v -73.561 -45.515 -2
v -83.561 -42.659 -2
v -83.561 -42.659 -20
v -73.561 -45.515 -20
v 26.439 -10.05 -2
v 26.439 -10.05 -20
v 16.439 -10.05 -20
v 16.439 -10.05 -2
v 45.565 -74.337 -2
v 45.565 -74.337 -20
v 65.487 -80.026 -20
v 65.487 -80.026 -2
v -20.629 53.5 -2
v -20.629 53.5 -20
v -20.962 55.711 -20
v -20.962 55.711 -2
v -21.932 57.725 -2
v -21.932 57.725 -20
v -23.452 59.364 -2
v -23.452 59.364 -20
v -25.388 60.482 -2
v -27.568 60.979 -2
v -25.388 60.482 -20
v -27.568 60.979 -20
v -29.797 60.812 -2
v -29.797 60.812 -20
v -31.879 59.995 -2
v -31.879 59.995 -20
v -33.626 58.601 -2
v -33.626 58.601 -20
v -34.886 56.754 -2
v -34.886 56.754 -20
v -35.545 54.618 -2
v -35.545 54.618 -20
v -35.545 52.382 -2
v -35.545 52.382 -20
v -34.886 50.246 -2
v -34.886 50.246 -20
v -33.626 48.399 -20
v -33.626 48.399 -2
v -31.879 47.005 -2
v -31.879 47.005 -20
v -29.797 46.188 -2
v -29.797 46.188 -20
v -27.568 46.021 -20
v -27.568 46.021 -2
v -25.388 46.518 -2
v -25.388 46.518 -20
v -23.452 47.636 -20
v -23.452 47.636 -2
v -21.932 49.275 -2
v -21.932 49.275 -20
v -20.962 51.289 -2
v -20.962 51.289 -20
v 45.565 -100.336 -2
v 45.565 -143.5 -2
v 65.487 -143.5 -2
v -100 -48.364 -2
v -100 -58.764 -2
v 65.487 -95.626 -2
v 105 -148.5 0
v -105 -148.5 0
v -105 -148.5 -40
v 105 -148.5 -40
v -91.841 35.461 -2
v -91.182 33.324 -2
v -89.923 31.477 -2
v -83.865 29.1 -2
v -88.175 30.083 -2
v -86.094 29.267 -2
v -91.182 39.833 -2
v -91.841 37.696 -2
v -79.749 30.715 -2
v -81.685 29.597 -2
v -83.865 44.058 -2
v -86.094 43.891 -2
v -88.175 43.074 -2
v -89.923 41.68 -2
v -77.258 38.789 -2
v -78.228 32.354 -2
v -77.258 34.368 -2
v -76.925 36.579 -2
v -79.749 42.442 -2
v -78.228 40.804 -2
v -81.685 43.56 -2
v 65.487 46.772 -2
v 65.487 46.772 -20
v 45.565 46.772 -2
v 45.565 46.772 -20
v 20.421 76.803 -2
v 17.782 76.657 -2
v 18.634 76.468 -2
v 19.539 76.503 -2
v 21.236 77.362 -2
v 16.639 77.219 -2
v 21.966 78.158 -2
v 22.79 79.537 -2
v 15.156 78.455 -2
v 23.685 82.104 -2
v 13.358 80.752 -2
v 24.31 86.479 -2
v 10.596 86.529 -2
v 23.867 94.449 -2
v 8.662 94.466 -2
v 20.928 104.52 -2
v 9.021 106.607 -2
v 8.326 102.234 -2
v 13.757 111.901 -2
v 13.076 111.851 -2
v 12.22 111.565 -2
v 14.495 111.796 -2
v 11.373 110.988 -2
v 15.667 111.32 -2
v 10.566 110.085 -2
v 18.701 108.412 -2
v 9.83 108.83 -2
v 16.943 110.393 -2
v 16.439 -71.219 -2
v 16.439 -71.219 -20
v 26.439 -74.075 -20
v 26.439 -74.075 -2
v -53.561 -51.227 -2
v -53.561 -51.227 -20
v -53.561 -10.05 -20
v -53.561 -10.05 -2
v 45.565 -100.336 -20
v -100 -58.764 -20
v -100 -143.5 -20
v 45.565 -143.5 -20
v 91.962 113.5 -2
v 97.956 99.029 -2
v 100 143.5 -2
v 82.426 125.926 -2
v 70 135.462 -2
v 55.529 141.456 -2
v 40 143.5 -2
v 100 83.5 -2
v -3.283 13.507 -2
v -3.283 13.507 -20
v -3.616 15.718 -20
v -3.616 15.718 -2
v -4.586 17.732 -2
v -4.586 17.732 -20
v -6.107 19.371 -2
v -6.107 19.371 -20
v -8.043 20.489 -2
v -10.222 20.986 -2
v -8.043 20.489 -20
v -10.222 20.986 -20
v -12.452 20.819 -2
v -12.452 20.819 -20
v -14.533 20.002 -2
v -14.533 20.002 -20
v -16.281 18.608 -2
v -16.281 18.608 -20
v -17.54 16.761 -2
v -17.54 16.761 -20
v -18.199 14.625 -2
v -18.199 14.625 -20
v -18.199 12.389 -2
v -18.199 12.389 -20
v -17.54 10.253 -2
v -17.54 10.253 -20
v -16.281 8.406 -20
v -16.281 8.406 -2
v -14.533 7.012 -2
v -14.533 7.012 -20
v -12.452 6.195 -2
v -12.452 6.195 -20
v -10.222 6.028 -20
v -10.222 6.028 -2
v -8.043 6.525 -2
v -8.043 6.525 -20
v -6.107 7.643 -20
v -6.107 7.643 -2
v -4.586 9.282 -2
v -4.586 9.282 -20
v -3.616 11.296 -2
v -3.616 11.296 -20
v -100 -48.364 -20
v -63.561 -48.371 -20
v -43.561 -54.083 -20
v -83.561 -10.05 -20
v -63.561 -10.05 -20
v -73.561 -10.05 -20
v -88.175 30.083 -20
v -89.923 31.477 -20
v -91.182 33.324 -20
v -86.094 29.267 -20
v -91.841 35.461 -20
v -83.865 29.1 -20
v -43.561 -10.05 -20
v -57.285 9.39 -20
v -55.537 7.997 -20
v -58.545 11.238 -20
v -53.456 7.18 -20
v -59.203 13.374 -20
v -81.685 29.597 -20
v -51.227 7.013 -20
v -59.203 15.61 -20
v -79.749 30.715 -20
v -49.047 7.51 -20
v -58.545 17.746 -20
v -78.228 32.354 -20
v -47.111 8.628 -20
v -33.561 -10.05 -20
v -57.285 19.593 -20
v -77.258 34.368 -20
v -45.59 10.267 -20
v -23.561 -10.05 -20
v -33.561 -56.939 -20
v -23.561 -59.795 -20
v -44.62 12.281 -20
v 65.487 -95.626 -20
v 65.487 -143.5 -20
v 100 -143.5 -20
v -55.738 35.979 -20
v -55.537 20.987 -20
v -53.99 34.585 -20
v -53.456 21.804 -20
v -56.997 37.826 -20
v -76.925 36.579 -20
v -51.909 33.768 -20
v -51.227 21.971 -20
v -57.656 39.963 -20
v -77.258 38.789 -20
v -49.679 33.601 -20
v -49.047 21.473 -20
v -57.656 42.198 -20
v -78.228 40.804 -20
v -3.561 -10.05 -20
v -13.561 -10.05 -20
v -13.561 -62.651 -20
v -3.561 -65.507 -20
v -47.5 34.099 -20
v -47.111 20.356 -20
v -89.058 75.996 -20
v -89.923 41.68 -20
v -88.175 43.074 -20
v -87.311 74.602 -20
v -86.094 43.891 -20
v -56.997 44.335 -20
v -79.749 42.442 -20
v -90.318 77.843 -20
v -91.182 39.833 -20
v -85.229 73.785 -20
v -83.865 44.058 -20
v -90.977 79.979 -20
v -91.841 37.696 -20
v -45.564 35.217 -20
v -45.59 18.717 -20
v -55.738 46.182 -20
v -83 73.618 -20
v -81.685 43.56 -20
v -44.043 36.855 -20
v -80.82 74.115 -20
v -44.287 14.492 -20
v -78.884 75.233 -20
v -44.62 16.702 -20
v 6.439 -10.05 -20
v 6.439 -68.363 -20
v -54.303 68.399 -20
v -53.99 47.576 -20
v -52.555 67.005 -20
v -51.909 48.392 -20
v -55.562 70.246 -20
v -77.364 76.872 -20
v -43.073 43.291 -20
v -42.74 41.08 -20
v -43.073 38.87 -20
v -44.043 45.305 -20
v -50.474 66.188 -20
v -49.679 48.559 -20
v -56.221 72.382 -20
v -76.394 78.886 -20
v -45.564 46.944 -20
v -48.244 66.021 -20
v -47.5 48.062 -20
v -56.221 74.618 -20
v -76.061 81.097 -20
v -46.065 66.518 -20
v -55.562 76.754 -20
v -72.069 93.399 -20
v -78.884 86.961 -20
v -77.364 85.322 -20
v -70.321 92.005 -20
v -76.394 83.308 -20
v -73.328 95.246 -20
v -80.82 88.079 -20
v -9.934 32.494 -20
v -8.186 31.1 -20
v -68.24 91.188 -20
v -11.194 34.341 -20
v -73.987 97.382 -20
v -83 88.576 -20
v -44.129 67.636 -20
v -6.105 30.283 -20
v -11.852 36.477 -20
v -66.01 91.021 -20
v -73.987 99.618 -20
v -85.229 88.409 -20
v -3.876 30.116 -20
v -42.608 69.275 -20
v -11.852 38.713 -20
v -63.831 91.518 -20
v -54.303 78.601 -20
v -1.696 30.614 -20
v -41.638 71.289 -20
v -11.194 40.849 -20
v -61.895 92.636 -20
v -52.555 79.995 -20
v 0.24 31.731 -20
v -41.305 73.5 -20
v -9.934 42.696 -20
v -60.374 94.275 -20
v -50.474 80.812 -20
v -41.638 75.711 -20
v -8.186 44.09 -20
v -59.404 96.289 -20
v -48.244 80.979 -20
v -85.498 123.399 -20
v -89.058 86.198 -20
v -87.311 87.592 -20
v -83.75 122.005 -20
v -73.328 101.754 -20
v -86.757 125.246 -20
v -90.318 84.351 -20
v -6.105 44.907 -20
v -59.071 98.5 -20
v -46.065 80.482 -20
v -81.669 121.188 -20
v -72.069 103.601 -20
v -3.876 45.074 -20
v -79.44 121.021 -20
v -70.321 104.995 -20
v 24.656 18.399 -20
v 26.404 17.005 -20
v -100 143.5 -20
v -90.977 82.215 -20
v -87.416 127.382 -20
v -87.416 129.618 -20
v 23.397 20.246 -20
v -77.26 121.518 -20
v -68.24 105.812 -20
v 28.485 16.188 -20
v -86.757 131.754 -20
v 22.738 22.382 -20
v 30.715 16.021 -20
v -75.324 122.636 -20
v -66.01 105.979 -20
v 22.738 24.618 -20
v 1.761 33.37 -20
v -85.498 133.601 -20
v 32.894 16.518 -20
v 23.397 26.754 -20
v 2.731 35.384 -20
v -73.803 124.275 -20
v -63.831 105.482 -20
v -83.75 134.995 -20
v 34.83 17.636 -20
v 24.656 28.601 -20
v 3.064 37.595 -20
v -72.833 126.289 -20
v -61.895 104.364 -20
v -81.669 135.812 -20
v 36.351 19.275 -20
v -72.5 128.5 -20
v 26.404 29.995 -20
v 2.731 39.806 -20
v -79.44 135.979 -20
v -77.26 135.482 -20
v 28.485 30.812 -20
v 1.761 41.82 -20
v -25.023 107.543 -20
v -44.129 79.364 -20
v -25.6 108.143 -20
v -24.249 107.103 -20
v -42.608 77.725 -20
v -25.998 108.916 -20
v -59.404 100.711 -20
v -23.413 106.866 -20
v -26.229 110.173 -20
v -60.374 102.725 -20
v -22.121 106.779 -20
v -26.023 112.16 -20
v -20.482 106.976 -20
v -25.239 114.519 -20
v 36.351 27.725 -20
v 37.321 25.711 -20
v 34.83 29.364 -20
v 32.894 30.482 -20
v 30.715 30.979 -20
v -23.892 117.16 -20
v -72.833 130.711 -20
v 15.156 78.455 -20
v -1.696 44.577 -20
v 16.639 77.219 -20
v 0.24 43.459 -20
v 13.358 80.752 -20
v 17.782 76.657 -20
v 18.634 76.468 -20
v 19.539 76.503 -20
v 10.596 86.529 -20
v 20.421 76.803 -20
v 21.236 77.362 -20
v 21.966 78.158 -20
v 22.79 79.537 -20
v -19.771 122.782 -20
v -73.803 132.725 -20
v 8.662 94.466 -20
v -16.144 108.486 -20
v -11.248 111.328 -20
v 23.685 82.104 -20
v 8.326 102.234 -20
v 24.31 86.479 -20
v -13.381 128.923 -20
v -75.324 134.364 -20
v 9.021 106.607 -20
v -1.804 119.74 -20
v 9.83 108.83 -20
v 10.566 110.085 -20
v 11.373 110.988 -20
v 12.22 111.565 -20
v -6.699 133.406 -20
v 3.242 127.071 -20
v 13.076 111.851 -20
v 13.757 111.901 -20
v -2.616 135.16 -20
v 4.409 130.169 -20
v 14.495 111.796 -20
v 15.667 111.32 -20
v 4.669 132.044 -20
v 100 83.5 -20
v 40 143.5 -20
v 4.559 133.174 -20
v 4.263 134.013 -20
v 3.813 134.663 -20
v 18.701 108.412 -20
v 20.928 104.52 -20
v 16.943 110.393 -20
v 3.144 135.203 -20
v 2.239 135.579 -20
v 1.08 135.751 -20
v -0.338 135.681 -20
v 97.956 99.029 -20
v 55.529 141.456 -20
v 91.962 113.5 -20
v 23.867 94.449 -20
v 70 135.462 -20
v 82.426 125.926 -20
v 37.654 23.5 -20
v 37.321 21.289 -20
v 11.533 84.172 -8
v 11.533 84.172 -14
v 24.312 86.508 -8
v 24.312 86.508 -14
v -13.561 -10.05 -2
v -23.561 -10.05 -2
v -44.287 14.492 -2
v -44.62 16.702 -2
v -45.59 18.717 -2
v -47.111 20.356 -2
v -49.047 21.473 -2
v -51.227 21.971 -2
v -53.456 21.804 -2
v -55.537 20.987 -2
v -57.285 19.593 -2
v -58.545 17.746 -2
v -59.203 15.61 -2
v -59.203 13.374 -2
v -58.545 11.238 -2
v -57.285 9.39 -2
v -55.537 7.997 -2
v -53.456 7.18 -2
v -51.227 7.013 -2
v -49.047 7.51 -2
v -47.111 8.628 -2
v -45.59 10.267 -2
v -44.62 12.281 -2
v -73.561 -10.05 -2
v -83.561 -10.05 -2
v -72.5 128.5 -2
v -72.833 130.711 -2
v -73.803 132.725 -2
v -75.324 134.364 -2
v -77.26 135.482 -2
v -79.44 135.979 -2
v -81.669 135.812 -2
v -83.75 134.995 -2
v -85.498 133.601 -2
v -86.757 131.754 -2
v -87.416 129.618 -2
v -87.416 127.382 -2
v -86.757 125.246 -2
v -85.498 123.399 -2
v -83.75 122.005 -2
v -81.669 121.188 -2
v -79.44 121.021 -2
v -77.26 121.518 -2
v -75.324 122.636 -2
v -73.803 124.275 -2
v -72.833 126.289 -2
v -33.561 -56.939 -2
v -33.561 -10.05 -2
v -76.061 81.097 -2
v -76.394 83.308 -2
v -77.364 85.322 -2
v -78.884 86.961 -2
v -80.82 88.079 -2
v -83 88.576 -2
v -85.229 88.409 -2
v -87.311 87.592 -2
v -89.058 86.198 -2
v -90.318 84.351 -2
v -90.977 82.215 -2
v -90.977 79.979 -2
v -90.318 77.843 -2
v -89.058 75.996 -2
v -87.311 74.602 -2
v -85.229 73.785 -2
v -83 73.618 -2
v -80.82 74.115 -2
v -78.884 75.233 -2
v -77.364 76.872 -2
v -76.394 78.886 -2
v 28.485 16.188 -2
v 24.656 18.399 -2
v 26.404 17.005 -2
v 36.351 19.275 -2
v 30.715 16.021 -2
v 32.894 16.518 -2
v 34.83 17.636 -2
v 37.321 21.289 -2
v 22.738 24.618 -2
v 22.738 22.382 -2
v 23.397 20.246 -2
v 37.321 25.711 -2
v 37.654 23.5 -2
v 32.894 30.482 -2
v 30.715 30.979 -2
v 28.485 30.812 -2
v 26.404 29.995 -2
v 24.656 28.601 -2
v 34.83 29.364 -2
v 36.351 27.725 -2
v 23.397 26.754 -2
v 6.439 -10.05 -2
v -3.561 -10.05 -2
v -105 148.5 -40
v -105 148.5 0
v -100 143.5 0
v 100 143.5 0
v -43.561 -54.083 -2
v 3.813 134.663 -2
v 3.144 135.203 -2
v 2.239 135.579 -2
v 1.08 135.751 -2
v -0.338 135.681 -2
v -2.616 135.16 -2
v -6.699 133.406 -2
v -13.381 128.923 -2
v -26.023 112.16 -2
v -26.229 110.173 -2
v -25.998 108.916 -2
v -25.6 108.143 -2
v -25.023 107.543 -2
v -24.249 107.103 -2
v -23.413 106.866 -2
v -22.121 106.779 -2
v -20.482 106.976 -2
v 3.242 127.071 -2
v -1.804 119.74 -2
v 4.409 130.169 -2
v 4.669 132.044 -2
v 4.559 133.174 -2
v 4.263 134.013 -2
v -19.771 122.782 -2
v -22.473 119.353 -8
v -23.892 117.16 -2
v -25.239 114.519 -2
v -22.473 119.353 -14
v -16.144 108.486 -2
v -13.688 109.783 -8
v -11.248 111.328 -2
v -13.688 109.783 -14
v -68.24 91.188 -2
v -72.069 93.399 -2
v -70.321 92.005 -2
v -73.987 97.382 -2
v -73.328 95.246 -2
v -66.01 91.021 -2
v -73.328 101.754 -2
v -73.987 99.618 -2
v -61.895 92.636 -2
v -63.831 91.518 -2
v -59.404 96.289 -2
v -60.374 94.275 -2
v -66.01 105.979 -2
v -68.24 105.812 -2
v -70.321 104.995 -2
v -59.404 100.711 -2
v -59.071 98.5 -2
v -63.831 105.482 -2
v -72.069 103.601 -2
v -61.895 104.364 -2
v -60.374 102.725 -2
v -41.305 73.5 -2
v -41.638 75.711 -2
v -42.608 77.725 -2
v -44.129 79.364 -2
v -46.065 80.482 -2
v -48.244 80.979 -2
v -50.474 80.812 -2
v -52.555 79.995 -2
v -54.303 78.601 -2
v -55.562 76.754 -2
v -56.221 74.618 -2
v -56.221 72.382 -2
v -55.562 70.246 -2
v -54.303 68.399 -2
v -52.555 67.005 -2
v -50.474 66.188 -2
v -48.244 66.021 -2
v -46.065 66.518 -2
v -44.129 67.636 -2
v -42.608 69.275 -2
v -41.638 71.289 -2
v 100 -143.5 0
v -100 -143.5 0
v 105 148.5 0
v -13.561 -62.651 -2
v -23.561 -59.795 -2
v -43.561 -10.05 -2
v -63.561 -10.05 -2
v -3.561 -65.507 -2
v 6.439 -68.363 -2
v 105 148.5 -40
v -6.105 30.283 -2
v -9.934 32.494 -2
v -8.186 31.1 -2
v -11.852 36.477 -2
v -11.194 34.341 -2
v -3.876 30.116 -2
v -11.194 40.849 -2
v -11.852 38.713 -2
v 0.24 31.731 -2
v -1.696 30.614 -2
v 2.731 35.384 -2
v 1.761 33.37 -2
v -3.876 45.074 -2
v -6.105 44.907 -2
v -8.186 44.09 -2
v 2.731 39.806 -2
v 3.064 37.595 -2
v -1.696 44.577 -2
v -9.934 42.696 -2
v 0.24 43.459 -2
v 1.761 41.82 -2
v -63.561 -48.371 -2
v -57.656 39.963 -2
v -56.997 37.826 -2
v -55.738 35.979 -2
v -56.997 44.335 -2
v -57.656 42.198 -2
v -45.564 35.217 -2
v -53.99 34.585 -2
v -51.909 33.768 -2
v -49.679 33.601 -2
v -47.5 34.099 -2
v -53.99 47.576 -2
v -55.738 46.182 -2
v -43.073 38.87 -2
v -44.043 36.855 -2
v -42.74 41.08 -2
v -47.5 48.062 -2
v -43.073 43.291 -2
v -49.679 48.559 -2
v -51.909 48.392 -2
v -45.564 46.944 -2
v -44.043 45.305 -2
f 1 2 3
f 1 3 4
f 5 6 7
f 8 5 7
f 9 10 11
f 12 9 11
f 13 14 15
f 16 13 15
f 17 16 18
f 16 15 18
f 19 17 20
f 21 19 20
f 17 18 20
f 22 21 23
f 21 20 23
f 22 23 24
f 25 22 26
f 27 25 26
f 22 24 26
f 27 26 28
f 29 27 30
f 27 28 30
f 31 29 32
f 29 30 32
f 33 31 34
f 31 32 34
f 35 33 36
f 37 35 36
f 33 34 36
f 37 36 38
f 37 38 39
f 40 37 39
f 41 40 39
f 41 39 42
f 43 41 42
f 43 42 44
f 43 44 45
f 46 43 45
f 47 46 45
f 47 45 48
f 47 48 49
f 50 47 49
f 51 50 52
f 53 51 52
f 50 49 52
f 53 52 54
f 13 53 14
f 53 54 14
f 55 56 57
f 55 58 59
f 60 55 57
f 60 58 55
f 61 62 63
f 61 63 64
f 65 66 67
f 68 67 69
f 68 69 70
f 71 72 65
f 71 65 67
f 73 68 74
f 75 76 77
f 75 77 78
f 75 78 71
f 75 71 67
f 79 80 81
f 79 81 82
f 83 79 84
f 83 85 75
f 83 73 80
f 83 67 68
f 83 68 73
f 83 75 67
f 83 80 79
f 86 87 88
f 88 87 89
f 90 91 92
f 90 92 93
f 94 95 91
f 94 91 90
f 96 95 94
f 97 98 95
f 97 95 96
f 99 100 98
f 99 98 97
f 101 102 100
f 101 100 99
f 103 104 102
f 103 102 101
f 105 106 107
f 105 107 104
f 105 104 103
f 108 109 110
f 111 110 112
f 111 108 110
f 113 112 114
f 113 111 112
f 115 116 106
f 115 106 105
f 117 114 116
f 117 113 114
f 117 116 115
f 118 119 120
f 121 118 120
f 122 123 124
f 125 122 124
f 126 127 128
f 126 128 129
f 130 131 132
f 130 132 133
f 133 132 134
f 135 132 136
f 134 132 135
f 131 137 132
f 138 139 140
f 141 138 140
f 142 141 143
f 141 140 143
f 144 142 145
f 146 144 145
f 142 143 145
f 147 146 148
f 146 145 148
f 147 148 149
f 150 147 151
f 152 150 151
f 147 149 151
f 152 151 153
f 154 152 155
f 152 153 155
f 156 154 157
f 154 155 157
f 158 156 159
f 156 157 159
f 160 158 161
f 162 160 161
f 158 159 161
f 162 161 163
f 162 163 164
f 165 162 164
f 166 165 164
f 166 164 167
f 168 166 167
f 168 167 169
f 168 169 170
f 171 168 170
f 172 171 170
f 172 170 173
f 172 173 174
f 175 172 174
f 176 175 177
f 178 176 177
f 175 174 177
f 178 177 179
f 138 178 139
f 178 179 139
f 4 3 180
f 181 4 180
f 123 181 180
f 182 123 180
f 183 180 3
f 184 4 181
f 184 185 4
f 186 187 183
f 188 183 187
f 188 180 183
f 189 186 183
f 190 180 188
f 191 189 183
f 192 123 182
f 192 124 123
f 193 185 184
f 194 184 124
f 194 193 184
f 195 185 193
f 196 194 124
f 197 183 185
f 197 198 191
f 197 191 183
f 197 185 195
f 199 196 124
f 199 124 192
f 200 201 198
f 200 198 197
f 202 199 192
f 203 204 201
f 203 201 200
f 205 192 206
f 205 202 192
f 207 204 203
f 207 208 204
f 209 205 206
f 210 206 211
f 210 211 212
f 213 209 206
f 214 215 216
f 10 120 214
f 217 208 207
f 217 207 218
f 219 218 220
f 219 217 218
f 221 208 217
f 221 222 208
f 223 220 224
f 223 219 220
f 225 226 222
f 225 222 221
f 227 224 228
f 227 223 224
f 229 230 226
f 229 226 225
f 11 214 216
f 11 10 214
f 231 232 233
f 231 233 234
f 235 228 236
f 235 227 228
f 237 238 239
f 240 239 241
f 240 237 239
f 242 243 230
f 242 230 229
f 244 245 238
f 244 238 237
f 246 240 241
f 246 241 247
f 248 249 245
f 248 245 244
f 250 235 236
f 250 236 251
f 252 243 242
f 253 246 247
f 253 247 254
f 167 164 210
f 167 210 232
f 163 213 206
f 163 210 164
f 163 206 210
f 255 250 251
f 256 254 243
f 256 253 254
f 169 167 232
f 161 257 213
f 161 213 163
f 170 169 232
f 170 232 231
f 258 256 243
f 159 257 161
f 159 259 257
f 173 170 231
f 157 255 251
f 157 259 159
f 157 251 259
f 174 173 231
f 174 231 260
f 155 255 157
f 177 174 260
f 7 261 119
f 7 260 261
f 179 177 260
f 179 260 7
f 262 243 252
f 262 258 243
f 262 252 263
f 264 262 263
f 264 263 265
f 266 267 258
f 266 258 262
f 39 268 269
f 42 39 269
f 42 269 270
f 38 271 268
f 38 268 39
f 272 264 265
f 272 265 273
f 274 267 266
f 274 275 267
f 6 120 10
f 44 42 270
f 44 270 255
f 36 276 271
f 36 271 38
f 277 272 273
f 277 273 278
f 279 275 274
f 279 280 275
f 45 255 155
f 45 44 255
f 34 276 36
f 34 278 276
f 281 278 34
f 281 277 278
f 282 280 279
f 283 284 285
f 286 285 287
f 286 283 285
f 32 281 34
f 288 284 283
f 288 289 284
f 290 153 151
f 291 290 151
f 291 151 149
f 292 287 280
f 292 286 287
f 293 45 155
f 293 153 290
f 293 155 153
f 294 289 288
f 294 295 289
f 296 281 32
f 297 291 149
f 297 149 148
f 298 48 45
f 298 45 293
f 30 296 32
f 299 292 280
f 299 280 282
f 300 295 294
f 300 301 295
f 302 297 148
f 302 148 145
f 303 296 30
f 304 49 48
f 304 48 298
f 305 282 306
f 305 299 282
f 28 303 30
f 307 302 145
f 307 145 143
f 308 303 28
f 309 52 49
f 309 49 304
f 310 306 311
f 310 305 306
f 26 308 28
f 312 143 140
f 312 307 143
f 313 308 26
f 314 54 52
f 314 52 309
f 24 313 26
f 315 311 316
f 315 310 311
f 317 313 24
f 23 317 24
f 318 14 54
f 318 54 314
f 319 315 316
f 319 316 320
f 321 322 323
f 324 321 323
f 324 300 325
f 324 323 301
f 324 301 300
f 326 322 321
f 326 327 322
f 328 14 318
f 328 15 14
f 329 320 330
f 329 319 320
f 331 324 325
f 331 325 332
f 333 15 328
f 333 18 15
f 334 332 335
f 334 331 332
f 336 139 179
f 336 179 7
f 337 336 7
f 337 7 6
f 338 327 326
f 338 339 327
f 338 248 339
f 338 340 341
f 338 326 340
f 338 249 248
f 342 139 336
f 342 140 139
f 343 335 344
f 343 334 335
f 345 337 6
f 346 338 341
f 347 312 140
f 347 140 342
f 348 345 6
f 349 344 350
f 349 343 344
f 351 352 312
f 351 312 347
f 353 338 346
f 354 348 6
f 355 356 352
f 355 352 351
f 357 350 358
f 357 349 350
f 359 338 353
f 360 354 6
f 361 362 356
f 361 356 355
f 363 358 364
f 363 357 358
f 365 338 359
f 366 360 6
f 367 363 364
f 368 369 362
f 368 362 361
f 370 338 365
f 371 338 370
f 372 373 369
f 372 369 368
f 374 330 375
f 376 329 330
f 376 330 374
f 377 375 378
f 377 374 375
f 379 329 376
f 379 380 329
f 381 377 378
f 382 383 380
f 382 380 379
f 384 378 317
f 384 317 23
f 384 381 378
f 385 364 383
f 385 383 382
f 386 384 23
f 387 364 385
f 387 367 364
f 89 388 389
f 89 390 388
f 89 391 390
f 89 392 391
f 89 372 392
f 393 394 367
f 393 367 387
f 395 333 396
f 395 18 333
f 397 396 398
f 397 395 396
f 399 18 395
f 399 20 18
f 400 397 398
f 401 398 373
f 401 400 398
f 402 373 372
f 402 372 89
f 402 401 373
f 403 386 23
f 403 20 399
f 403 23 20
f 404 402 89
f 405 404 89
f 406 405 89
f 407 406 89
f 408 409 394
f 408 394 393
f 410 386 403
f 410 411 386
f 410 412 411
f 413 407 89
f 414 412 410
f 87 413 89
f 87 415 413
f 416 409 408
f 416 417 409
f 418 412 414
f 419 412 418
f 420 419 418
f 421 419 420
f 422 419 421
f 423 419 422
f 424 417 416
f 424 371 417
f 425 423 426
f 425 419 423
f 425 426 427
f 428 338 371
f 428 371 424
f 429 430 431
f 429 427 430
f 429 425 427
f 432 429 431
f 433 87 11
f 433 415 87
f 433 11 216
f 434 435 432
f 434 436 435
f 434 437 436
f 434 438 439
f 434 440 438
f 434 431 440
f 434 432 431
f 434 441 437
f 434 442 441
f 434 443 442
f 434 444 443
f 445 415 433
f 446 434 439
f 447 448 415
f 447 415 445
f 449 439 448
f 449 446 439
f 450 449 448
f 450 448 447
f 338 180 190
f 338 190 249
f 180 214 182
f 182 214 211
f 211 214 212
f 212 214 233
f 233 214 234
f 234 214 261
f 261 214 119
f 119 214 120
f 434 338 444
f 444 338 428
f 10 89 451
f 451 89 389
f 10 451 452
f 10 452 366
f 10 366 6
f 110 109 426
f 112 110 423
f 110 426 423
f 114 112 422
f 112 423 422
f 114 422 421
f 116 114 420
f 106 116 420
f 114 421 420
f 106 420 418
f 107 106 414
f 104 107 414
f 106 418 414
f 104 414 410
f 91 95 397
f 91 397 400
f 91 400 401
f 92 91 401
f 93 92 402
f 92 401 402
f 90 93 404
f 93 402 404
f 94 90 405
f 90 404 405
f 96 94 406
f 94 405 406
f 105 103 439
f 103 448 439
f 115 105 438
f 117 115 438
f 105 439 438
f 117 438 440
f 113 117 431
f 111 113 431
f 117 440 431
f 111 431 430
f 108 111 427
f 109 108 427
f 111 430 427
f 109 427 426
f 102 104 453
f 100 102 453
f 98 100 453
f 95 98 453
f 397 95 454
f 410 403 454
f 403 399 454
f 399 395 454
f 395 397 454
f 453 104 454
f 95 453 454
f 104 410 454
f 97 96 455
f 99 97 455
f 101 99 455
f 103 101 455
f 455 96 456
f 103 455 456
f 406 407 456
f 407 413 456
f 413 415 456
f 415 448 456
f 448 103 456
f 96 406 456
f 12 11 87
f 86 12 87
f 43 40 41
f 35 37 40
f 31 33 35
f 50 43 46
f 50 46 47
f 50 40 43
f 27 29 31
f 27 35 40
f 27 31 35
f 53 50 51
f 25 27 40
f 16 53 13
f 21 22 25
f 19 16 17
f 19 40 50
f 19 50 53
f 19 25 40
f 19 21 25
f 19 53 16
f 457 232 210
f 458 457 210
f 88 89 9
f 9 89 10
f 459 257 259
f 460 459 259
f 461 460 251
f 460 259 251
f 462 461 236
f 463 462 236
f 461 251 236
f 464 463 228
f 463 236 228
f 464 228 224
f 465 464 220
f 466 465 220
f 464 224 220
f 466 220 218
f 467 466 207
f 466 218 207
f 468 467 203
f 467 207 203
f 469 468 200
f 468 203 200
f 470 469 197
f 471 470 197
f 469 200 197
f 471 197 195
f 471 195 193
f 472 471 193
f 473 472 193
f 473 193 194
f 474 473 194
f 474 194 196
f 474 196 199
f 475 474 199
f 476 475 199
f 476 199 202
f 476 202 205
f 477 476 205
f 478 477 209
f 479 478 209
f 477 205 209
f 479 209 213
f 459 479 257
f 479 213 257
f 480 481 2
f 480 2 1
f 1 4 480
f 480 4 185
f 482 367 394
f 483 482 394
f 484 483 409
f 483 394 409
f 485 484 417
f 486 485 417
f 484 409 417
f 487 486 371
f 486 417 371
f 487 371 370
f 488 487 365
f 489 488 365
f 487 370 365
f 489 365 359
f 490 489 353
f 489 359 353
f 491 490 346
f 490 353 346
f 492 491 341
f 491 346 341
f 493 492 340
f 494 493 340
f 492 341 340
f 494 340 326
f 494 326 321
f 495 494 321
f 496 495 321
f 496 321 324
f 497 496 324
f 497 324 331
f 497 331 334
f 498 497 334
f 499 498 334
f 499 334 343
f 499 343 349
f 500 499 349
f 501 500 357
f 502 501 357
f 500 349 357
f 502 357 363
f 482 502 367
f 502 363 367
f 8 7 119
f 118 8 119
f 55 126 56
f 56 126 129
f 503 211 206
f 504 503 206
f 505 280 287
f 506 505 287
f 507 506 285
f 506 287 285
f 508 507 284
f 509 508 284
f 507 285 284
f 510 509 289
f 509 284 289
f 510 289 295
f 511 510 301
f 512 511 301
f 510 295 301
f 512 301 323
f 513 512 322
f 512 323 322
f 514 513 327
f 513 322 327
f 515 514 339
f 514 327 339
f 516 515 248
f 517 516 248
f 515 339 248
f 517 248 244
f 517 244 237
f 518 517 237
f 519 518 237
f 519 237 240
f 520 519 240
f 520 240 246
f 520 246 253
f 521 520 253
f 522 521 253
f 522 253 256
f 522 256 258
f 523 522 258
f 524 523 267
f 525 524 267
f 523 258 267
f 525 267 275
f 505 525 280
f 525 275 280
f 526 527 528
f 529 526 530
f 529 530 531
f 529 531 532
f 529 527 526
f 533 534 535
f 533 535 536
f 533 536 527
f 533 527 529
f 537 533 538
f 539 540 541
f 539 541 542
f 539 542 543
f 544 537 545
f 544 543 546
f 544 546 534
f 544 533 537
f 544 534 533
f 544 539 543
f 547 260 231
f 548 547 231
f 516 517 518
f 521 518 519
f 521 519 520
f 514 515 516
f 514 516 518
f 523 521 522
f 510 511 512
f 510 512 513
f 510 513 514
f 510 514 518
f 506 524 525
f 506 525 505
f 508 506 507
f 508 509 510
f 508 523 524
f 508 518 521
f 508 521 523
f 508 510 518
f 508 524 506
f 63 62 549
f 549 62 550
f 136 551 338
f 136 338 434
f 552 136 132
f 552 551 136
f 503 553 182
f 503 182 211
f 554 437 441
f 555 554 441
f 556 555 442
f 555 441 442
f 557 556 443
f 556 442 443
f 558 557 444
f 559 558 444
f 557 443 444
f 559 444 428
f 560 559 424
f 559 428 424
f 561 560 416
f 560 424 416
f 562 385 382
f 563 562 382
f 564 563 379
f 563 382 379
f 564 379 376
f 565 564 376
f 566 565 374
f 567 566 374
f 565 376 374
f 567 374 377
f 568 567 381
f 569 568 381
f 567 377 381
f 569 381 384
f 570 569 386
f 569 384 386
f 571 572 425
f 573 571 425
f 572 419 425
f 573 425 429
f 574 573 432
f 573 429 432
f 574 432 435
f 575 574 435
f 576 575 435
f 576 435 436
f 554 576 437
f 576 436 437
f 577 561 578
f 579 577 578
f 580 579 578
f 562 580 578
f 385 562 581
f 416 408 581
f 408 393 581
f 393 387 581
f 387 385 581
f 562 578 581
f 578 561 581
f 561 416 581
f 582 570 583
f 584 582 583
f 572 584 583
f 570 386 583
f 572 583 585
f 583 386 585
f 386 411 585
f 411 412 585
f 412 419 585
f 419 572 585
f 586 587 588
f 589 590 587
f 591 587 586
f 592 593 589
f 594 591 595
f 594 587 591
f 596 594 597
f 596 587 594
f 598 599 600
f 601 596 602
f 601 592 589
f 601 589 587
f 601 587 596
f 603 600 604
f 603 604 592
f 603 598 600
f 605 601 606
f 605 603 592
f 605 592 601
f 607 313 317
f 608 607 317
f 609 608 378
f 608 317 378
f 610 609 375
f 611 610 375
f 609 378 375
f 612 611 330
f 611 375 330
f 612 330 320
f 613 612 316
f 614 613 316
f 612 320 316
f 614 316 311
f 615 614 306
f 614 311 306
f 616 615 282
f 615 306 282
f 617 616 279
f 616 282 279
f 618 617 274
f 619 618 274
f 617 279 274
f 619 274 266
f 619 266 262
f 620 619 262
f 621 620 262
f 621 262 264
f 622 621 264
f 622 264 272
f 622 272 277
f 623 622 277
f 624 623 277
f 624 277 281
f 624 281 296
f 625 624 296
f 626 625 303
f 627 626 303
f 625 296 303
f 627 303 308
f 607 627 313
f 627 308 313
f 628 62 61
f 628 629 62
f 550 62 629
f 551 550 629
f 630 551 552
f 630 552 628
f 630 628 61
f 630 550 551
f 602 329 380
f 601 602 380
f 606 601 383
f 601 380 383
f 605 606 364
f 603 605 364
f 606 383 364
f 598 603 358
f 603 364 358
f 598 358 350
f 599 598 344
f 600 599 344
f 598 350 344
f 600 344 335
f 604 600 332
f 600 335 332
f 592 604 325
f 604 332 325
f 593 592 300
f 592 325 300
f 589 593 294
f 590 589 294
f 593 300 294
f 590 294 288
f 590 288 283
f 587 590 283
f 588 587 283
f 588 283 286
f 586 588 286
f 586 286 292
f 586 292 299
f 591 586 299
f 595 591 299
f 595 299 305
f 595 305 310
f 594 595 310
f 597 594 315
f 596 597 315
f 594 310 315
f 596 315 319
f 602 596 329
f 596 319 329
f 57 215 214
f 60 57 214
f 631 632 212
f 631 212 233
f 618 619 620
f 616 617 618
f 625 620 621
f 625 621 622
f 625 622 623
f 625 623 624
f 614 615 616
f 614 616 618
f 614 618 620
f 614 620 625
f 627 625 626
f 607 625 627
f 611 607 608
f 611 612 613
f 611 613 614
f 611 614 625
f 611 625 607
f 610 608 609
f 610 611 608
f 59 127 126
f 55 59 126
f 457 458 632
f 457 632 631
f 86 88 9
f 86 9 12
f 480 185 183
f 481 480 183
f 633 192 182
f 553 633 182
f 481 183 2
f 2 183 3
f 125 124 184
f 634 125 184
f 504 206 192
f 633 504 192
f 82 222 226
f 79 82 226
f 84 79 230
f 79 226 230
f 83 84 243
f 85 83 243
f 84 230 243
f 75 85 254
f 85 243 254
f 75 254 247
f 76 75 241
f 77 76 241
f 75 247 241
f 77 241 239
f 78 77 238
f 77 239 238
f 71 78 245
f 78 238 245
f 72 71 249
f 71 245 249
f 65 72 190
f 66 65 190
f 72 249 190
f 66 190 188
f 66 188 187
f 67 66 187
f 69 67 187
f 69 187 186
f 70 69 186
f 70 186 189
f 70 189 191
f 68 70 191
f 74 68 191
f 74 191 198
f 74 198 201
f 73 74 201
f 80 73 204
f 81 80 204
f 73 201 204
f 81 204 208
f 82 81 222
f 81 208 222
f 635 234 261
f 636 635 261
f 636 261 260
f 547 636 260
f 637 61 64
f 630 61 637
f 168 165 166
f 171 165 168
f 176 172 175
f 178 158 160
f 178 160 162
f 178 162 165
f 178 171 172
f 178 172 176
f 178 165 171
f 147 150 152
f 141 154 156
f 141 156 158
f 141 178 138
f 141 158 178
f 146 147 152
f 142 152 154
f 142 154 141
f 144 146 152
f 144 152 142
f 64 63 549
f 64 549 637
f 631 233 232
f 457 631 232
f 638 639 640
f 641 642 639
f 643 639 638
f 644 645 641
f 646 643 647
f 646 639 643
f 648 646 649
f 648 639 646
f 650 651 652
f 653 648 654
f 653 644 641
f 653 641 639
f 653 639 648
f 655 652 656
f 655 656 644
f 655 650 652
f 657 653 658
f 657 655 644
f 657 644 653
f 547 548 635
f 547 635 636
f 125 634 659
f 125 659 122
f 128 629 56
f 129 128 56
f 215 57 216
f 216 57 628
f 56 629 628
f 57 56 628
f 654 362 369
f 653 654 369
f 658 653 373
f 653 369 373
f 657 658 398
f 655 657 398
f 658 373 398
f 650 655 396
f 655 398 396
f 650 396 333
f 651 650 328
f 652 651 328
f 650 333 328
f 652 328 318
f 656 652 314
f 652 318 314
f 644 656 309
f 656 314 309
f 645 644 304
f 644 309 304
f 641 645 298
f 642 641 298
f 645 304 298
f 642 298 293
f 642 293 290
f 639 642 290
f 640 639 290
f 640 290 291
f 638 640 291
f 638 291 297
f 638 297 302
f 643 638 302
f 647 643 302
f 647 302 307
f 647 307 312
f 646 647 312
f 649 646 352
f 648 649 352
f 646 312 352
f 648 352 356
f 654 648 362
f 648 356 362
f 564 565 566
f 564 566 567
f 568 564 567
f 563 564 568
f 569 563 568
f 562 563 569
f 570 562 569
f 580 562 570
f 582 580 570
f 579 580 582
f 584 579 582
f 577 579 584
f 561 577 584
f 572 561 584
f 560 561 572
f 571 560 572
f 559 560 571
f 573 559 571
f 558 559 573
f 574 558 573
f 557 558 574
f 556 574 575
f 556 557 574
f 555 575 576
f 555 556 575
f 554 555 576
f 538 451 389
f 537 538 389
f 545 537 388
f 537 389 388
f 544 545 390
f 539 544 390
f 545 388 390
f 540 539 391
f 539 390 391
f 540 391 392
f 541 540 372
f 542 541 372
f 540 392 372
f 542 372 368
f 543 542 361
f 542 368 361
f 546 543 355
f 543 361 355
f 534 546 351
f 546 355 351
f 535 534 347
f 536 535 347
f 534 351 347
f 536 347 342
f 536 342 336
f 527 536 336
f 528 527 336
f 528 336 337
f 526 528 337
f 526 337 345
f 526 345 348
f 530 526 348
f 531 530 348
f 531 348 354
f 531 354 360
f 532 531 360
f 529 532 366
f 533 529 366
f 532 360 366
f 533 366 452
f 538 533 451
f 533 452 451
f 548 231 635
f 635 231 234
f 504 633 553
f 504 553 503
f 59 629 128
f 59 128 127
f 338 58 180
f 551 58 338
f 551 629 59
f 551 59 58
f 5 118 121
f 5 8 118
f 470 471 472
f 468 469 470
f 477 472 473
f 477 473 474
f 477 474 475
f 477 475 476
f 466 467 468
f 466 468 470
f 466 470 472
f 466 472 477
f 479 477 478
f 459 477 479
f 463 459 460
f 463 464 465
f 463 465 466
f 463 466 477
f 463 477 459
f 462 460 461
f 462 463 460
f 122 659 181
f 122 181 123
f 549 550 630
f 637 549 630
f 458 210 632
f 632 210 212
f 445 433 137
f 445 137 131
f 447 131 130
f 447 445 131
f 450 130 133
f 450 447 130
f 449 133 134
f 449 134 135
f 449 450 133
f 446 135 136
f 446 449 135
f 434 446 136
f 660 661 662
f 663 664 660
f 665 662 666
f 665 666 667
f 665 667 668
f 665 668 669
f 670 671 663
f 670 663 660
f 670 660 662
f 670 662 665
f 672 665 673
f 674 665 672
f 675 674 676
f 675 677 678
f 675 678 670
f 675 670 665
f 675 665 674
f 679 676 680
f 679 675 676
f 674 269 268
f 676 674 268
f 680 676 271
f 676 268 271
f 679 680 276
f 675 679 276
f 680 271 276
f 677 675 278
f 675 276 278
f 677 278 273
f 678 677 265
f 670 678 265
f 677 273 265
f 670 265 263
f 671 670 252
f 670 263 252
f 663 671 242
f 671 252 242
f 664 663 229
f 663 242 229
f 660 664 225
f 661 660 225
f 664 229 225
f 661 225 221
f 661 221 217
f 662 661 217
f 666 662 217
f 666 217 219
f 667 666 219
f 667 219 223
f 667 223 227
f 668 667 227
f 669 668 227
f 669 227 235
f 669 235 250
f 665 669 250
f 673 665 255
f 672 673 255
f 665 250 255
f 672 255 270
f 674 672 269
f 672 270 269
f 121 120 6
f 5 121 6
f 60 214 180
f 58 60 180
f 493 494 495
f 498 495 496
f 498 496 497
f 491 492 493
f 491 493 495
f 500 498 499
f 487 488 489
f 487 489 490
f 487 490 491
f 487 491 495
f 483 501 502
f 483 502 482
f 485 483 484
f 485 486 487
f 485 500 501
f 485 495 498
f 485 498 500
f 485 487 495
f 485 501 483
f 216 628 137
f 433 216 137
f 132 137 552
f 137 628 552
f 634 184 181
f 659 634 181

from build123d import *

# Parameters (mm, degrees)
SKETCH_1_W          = 210
SKETCH_1_H          = 297
EXTRUDE_1_DEPTH     = 40
SKETCH_2_W          = 200
SKETCH_2_H          = 287
CUT_EXTRUDE_1_DEPTH = 20
SKETCH_3_R          = 7.5
EXTRUDE_2_DEPTH     = 18
EXTRUDE_3_DEPTH     = 18


with BuildPart() as part:
    # 草圖1 → 填料-伸長1 (new body)
    with BuildSketch(Plane.XY):
        Rectangle(SKETCH_1_W, SKETCH_1_H)
    extrude(amount=-EXTRUDE_1_DEPTH)

    # 草圖2 → 除料-伸長1 (cut)
    with BuildSketch(Plane.XY):
        Rectangle(SKETCH_2_W, SKETCH_2_H)
    extrude(amount=-CUT_EXTRUDE_1_DEPTH, mode=Mode.SUBTRACT)

    # 草圖3 → 填料-伸長2 (add)
    with BuildSketch(Plane.XY.offset(-20)):
        Polygon((45.565174328, -143.5), (65.486710308, -143.5), (65.486710308, -95.625994785), (-100, -48.364191076), (-100, -58.764014226), (45.565174328, -100.336371808), align=None)
        Polygon((65.486710308, -80.02626006), (65.486710308, 46.771617849), (45.565174328, 46.771617849), (45.565174328, -74.336813933), align=None)
        Polygon((16.43949597, -71.218643102), (26.43949597, -74.074570543), (26.43949597, -10.050257104), (16.43949597, -10.050257104), align=None)
        Polygon((-73.56050403, -10.050257104), (-83.56050403, -10.050257104), (-83.56050403, -42.659368692), (-73.56050403, -45.515296133), align=None)
        Polygon((-53.56050403, -10.050257104), (-63.56050403, -10.050257104), (-63.56050403, -48.371223574), (-53.56050403, -51.227151015), align=None)
        Polygon((-33.56050403, -56.939005897), (-33.56050403, -10.050257104), (-43.56050403, -10.050257104), (-43.56050403, -54.083078456), align=None)
        Polygon((-13.56050403, -62.650860779), (-13.56050403, -10.050257104), (-23.56050403, -10.050257104), (-23.56050403, -59.794933338), align=None)
        Polygon((6.43949597, -10.050257104), (-3.56050403, -10.050257104), (-3.56050403, -65.50678822), (6.43949597, -68.362715661), align=None)
        with Locations((-80, 128.5)):
            Circle(SKETCH_3_R)
        with Locations((-66.570869478, 98.5)):
            Circle(SKETCH_3_R)
        with Locations((-48.804847533, 73.5)):
            Circle(SKETCH_3_R)
        with Locations((-28.128524571, 53.5)):
            Circle(SKETCH_3_R)
        with Locations((30.154024986, 23.5)):
            Circle(SKETCH_3_R)
        with Locations((-4.436239635, 37.595056508)):
            Circle(SKETCH_3_R)
        with Locations((-83.56050403, 81.097019172)):
            Circle(SKETCH_3_R)
        with Locations((-50.239783165, 41.080389262)):
            Circle(SKETCH_3_R)
        with Locations((-10.782679355, 13.507027121)):
            Circle(SKETCH_3_R)
        with Locations((-84.425125003, 36.578615851)):
            Circle(SKETCH_3_R)
        with Locations((-51.787267775, 14.491790055)):
            Circle(SKETCH_3_R)
        with BuildLine():
            add(Edge.make_bspline(
                [(3.812950522, 134.663232329), (-4.971133753, 144.233491649), (-22.472536431, 119.353413889), (-39.973939109, 94.473336129), (-13.688452156, 109.783154569), (12.597034797, 125.092973009), (3.812950522, 134.663232329)],
                knots=[0, 0, 0, 2.094395102, 2.094395102, 4.188790205, 4.188790205, 6.283185307, 6.283185307, 6.283185307], degree=2, weights=[1, 0.5, 1, 0.5, 1, 0.5, 1]))
        make_face()
        with BuildLine():
            add(Edge.make_bspline(
                [(13.075828168, 111.85142679), (0.297213563, 109.515402653), (11.533016148, 84.171918363), (22.768818733, 58.828434072), (24.311630754, 86.5079425), (25.854442774, 114.187450927), (13.075828168, 111.85142679)],
                knots=[0, 0, 0, 2.094395102, 2.094395102, 4.188790205, 4.188790205, 6.283185307, 6.283185307, 6.283185307], degree=2, weights=[1, 0.5, 1, 0.5, 1, 0.5, 1]))
        make_face()
    extrude(amount=EXTRUDE_2_DEPTH)

    # 草圖4 → 填料-伸長3 (add)
    with BuildSketch(Plane.XY.offset(-20)):
        with BuildLine():
            Line((40, 143.5), (100, 143.5))
            Line((100, 143.5), (100, 83.5))
            ThreePointArc((100, 83.5), (82.426406871, 125.926406871), (40, 143.5))
        make_face()
    extrude(amount=EXTRUDE_3_DEPTH)


solid = part.part
